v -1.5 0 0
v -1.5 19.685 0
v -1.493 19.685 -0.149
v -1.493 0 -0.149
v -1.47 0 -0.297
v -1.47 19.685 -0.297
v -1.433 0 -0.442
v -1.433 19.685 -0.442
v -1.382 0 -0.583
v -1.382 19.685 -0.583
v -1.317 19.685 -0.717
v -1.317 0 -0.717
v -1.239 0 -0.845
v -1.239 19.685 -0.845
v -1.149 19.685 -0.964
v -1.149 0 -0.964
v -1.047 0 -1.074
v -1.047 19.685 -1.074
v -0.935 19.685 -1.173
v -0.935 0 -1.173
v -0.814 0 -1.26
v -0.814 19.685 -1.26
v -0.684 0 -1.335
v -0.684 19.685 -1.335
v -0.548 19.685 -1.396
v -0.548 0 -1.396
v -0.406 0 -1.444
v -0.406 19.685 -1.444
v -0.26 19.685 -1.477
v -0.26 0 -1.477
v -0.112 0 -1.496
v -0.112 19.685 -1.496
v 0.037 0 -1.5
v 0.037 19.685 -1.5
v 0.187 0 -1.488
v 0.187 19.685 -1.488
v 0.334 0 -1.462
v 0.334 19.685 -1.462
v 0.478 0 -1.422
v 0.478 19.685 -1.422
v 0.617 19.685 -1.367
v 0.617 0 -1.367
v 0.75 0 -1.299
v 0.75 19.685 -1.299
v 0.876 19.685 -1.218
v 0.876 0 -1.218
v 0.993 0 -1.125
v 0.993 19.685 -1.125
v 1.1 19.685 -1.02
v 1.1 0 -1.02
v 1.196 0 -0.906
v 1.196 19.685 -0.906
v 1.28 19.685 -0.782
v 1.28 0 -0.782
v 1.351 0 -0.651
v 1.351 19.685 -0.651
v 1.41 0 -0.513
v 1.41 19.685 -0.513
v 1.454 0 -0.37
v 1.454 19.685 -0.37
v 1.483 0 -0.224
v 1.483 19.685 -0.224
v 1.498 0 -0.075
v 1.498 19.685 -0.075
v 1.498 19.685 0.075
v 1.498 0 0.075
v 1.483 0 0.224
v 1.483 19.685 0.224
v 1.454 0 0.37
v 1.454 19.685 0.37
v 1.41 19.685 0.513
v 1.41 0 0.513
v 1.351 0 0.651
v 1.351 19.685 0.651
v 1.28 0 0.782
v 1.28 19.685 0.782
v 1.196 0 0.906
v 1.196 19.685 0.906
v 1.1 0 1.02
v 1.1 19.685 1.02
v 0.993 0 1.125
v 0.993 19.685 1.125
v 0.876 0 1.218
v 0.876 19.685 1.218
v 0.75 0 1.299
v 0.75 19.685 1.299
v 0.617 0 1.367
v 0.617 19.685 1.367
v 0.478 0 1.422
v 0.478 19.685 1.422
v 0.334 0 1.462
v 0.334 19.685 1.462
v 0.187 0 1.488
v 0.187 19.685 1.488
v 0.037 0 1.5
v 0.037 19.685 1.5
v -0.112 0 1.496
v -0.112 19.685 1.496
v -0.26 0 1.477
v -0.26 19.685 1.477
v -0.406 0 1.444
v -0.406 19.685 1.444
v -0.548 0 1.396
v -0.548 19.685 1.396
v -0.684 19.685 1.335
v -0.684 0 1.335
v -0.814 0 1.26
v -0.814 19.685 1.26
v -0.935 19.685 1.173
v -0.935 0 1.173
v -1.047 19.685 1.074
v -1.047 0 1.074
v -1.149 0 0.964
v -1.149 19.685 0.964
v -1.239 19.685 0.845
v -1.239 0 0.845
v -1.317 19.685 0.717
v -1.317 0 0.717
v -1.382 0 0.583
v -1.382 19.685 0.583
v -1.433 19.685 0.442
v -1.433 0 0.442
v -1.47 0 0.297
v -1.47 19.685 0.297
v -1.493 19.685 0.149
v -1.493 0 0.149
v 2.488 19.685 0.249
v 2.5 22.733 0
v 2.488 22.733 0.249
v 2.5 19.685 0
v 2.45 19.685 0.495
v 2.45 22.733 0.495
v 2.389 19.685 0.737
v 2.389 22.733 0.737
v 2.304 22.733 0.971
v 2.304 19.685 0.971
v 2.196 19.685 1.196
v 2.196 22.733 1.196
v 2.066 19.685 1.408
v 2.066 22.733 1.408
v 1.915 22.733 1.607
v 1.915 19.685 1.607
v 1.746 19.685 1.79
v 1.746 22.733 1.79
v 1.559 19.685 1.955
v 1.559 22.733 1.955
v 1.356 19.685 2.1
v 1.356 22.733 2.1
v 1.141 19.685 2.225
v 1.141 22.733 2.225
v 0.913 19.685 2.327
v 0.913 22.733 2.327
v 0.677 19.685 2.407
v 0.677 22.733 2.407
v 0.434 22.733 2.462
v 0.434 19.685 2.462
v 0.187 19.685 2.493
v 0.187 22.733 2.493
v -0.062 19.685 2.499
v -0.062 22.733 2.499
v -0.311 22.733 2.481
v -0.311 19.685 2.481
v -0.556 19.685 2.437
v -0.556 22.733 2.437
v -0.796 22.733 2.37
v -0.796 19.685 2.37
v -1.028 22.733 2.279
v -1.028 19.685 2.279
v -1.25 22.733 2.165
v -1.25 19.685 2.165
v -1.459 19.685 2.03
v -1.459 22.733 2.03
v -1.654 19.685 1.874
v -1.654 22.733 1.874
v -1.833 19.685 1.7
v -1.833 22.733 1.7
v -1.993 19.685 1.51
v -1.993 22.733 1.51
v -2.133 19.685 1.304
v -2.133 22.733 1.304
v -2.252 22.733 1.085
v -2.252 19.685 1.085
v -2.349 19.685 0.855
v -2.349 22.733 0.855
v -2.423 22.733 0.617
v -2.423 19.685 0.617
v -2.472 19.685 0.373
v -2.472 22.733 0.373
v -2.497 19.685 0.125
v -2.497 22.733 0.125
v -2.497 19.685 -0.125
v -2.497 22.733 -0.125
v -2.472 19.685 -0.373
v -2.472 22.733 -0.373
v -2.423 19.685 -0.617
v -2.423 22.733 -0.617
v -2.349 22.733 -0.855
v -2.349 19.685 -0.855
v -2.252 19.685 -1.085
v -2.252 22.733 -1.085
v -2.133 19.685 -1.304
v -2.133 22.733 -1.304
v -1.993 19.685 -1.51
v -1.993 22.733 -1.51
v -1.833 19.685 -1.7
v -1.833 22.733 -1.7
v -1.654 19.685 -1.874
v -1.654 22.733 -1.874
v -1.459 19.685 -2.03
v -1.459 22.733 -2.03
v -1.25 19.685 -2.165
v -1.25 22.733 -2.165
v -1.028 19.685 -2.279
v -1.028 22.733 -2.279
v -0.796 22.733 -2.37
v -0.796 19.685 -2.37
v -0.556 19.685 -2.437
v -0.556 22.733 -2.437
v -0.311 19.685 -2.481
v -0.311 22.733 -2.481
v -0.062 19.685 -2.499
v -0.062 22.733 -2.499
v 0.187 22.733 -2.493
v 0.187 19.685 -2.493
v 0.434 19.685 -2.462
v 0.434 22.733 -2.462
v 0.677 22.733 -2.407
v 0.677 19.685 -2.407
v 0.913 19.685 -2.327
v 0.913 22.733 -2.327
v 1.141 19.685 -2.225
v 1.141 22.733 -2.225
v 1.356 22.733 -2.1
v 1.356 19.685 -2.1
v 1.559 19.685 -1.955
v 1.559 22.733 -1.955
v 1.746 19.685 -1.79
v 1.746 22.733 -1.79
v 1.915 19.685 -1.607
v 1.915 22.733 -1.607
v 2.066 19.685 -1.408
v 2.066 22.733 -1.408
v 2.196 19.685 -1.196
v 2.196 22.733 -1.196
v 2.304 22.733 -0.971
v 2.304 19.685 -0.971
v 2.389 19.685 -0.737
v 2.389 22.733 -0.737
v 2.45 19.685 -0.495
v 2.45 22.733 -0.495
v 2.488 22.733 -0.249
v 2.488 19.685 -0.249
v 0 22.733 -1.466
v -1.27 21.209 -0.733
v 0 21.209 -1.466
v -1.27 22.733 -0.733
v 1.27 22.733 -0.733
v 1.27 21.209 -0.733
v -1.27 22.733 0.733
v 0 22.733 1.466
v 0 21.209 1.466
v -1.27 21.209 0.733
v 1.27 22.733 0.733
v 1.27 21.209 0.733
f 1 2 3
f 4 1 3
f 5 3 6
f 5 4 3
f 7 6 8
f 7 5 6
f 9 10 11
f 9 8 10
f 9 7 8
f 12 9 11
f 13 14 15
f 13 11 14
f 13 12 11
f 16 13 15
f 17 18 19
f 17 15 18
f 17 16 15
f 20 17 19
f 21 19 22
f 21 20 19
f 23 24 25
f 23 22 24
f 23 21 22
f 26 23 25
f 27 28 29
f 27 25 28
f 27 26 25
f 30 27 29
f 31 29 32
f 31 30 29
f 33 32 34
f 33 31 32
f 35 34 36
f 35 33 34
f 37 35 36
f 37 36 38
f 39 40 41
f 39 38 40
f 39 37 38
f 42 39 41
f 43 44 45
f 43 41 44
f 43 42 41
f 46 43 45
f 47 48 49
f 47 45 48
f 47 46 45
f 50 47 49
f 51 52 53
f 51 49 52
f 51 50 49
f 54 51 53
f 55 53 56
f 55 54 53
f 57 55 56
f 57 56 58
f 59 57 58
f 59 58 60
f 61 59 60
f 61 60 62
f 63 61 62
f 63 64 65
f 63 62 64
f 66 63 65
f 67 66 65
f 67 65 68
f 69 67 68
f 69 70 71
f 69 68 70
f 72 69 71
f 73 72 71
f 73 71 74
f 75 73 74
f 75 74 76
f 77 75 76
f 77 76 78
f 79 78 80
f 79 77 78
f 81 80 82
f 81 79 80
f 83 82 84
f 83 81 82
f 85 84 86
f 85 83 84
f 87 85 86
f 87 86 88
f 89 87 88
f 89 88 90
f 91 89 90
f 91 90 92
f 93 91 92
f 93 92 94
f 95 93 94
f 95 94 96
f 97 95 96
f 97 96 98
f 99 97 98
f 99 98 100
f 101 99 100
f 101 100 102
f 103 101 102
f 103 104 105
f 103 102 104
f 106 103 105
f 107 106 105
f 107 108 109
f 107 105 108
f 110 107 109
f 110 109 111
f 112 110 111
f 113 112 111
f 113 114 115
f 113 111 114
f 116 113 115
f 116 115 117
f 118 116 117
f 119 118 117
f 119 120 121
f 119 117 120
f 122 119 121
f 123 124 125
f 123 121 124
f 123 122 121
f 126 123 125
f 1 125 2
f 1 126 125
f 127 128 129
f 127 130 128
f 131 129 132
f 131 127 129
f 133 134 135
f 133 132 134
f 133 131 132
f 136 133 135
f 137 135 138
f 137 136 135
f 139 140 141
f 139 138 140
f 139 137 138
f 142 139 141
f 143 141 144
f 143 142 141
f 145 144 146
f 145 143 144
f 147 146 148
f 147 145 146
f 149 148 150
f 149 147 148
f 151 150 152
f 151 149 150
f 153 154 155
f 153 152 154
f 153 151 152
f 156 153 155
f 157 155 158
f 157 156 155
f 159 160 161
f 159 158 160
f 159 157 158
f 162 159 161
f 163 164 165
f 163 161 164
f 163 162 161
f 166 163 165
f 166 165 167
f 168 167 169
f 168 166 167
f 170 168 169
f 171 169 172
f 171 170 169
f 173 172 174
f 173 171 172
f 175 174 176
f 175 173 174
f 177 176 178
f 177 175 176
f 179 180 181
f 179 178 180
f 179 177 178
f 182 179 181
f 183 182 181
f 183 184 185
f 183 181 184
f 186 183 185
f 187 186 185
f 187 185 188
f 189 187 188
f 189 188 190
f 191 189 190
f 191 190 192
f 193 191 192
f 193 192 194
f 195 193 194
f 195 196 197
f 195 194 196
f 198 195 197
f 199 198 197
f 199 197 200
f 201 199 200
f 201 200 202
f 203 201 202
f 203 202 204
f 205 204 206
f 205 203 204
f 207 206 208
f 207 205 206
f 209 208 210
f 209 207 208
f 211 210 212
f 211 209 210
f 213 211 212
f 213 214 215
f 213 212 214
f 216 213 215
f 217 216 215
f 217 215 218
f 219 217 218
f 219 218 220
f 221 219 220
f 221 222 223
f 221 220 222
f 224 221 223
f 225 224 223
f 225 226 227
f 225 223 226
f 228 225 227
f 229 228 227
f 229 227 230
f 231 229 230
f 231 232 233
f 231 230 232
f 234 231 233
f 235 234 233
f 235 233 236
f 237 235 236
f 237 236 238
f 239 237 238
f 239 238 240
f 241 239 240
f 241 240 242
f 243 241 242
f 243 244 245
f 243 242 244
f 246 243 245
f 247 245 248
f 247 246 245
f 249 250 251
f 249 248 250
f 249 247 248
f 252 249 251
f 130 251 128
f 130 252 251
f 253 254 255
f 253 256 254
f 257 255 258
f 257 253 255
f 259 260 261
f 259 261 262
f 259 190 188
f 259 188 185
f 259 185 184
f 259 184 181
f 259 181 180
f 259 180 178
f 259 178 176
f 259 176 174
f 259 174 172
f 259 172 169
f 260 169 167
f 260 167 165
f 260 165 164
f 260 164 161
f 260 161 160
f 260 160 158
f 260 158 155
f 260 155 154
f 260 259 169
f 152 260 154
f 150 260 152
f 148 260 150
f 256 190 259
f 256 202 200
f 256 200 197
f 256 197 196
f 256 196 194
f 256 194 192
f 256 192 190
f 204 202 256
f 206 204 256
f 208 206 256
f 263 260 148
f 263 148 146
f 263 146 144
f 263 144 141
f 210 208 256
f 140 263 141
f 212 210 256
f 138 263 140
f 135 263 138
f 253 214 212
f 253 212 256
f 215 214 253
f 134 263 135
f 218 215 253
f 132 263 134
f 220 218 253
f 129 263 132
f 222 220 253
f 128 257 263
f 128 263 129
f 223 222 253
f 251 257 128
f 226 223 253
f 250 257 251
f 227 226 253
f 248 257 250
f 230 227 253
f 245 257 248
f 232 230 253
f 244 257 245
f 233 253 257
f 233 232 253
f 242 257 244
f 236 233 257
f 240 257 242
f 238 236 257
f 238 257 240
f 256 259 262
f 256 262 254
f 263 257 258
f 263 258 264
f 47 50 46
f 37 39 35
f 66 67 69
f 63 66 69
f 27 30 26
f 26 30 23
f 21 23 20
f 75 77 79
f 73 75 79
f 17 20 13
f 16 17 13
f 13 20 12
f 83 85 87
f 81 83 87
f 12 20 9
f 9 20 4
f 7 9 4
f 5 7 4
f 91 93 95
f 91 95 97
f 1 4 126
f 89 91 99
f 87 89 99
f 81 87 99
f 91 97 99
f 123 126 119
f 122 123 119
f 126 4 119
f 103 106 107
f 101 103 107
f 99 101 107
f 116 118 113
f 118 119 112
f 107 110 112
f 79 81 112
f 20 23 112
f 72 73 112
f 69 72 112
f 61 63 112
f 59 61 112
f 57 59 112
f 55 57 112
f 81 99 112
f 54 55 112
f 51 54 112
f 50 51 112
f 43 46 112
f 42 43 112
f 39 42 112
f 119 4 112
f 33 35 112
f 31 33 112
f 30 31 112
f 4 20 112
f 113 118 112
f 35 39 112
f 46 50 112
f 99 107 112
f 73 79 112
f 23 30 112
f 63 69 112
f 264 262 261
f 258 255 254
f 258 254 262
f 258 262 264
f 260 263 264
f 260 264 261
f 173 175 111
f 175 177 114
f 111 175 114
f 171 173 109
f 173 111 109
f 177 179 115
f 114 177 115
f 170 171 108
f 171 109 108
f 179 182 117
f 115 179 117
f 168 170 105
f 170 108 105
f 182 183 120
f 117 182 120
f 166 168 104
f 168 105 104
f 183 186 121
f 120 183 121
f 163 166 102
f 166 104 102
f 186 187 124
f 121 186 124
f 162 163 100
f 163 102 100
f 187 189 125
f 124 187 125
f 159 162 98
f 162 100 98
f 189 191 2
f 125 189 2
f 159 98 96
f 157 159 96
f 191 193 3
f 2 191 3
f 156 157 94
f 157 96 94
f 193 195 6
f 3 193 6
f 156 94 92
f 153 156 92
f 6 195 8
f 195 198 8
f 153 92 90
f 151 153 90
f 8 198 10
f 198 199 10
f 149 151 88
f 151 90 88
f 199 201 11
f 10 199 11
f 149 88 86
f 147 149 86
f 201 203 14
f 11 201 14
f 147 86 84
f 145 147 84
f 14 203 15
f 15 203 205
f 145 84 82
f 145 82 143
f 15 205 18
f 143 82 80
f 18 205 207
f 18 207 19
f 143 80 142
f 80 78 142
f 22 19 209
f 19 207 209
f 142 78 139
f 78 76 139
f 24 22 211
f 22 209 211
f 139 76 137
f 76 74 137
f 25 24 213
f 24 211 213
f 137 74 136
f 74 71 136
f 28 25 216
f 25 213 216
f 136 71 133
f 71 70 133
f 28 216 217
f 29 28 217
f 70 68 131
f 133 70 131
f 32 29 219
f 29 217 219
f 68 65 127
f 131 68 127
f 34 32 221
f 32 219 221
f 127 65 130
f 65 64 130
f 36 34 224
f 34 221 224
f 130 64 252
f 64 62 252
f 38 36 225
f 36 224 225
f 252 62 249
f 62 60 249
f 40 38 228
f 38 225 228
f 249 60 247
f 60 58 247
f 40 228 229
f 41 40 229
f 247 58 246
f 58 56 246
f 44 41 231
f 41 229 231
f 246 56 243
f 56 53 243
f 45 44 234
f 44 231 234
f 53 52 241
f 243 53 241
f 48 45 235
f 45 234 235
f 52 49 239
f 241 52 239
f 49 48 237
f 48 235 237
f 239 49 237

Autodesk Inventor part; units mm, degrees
ref_plane "YZ Plane" through (0, 0, 0) normal (1, 0, 0) x (0, 1, 0)
ref_plane "XZ Plane" through (0, 0, 0) normal (0, 1, 0) x (-1, 0, 0)
ref_plane "XY Plane" through (0, 0, 0) normal (0, 0, 1) x (1, 0, 0)
sketch "Sketch1" plane through (0, 0, 0) normal (0, 1, 0) x (-1, 0, 0)
  circle A0 centre (0, 0) radius 1.5
  dimension "d0" = 3
extrude "Extrusion1" add sketch "Sketch1" along normal blind 19.685
sketch "Sketch2" plane through (0, 19.685, 0) normal (0, 1, 0) x (1, 0, 0)
  circle A0 centre (0, 0) radius 1.5 projected
  circle A1 centre (0, 0) radius 2.5
  dimension "d3" = 5
extrude "Extrusion2" add sketch "Sketch2" along normal blind 3.048 contours A0 | A1
sketch "Sketch3" plane through (0, 22.733, 0) normal (0, 1, 0) x (1, 0, 0)
  circle A0 centre (0, 0) radius 2.5 projected
  line L0 (-1.27, 0.7332) -> (0, 1.4665)
  line L1 (0, 1.4665) -> (1.27, 0.7332)
  line L2 (1.27, 0.7332) -> (1.27, -0.7332)
  line L3 (1.27, -0.7332) -> (0, -1.4665)
  line L4 (0, -1.4665) -> (-1.27, -0.7332)
  line L5 (-1.27, -0.7332) -> (-1.27, 0.7332)
  dimension "d6" = 1.27
extrude "Extrusion3" cut sketch "Sketch3" against normal blind 1.524 contours L0 L1 L2 L3 L4 L5
thread "Thread1" size "5-40 UNC" class "2A" standard "ANSI Unified Screw Threads" full length
properties part number "Threaded Rod Screw"
